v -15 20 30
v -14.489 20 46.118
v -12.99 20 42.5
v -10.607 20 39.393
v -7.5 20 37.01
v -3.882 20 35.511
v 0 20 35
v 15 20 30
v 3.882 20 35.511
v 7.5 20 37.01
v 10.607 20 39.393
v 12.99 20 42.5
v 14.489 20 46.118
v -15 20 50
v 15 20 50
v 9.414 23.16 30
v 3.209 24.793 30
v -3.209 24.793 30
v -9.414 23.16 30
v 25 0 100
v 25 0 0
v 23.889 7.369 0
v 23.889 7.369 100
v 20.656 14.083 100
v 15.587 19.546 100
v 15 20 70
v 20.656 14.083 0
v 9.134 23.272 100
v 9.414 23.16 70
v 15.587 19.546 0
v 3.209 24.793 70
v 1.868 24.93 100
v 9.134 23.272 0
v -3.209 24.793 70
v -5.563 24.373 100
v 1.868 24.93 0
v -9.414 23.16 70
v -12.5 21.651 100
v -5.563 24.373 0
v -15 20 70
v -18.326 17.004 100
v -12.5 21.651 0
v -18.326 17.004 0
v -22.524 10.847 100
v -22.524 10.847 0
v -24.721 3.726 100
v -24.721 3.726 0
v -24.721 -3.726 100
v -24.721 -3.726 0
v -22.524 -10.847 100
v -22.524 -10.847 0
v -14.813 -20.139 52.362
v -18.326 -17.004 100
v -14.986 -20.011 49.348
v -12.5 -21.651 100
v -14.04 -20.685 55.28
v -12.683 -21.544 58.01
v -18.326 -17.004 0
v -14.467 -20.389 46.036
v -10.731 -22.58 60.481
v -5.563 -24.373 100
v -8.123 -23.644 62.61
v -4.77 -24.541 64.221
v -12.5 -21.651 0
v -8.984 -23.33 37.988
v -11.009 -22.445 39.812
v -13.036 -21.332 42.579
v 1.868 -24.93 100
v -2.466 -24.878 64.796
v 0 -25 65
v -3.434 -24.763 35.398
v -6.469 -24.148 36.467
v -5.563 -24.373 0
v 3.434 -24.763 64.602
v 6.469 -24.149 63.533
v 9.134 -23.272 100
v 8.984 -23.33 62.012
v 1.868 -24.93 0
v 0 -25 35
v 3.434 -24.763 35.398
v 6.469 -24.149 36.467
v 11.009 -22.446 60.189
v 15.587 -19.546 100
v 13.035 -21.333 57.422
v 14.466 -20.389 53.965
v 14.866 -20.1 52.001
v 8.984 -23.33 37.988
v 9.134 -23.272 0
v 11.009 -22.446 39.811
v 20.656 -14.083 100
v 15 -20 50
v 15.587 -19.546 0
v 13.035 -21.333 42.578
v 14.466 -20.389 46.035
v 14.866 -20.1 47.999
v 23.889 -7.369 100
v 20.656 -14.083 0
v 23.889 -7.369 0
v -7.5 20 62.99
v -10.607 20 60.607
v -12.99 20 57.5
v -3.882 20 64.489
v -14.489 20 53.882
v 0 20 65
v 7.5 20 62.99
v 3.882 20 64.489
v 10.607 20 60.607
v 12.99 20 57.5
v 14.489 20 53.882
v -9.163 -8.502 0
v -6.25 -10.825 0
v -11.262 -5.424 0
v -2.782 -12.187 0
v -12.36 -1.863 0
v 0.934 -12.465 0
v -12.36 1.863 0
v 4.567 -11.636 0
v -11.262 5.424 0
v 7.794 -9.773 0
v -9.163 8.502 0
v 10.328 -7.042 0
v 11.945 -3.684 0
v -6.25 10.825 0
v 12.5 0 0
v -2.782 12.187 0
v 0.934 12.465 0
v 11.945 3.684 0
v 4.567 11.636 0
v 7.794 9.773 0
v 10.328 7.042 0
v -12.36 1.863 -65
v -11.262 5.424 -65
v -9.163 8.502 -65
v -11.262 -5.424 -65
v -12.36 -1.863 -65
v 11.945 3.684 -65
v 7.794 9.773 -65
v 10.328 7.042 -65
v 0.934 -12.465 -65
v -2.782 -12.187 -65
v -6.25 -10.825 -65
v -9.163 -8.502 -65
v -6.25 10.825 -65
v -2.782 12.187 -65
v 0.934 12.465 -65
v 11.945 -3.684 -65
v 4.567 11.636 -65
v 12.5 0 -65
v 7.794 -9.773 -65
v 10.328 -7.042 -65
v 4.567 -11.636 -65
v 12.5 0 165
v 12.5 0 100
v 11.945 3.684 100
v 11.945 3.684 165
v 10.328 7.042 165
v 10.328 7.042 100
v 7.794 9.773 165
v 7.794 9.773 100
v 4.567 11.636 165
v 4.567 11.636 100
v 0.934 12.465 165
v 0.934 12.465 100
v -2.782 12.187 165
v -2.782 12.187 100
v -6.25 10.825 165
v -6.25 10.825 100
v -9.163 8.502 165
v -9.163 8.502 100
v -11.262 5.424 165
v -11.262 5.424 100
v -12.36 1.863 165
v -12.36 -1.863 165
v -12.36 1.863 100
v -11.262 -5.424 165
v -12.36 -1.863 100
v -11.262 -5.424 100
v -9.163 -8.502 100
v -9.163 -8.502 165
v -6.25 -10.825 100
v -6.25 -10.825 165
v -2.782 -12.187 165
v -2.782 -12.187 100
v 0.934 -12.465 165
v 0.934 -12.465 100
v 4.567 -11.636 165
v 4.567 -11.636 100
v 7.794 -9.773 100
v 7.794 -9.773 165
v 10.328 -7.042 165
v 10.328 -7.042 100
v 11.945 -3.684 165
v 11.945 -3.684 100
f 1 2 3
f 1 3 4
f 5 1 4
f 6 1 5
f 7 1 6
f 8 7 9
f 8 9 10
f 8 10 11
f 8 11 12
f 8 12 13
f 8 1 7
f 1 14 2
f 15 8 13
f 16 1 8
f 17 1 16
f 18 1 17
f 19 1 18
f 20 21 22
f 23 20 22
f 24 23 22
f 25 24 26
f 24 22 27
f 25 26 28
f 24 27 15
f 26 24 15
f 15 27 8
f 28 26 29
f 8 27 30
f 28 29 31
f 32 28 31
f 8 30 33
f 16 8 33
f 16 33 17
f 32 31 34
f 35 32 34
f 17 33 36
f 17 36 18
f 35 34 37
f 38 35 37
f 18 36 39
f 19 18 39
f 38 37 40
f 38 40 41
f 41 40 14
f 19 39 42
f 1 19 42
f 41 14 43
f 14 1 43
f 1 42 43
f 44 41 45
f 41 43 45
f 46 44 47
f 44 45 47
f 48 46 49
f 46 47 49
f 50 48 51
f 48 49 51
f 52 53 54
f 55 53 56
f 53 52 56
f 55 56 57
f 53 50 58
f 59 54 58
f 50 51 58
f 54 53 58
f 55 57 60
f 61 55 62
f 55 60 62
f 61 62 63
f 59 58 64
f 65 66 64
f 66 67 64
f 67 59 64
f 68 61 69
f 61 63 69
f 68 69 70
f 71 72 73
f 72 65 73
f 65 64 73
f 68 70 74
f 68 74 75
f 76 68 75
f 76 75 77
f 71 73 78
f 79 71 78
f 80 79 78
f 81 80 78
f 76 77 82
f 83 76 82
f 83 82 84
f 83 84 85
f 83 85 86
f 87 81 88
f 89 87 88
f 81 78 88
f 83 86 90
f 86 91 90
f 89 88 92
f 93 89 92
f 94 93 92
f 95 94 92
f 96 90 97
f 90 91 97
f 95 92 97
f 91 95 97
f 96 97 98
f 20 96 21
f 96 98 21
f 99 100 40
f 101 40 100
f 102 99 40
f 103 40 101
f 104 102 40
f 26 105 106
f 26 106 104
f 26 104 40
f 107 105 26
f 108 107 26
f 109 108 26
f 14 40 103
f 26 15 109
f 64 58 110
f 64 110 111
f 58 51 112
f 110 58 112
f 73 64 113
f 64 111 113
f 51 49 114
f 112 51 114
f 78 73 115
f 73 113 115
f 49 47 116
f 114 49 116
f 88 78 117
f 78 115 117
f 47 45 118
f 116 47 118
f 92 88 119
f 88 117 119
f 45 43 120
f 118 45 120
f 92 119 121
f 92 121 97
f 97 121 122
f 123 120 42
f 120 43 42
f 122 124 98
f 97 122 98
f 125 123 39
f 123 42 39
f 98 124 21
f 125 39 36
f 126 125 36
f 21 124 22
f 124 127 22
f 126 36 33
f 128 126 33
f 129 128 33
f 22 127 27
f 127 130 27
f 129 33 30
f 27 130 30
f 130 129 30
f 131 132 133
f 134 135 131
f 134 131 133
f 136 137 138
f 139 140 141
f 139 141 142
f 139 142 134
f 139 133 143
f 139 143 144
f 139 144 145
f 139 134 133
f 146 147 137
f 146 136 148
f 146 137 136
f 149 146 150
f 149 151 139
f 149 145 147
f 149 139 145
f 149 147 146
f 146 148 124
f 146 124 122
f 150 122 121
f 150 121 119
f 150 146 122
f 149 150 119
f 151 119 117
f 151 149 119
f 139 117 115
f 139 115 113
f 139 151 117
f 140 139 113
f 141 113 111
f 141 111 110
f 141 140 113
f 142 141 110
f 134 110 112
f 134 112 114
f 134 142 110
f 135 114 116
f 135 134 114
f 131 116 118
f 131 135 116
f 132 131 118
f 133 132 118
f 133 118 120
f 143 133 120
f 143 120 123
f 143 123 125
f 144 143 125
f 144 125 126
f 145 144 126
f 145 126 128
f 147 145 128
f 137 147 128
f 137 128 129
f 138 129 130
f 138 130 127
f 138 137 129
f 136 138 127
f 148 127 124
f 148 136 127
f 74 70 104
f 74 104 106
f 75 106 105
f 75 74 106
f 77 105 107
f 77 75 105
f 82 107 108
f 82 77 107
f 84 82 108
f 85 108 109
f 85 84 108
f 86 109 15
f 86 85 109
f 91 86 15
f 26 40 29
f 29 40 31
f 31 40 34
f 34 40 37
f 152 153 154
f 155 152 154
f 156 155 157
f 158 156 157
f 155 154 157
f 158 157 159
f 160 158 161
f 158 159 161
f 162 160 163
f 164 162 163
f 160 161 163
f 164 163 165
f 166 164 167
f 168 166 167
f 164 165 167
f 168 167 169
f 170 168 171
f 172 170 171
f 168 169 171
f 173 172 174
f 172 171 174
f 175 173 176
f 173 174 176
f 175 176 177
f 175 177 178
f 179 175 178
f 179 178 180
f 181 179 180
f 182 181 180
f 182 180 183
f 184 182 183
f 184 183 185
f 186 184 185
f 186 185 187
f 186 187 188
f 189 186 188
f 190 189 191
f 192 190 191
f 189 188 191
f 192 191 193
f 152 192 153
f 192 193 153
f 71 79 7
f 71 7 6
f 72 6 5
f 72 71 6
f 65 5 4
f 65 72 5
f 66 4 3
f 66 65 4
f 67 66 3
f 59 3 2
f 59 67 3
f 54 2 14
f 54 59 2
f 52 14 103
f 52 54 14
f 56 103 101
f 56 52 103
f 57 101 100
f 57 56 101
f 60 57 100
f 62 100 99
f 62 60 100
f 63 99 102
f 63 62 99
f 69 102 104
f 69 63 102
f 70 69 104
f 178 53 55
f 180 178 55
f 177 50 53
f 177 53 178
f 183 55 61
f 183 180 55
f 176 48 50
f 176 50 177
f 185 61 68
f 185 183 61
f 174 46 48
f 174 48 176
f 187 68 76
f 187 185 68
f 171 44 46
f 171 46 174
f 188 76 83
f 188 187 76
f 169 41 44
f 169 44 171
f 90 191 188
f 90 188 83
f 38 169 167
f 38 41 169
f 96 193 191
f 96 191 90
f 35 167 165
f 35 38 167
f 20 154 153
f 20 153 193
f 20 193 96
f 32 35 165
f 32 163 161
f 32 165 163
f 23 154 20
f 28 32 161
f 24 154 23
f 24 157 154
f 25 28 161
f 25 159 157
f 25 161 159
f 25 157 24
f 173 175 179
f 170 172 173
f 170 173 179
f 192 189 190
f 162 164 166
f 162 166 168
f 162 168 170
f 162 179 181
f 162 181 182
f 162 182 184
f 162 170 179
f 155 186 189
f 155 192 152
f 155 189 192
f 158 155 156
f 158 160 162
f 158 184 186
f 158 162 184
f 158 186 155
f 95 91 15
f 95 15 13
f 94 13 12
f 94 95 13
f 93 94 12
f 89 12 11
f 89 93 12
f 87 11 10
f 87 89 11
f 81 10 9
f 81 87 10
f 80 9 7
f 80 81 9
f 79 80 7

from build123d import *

# Parameters (mm, degrees)
IZIM1_R                     = 25
Y_KSEKLIK_EKSTR_ZYON1_DEPTH = 100
IZIM2_R                     = 12.5
Y_KSEKLIK_EKSTR_ZYON2_DEPTH = 65
Y_KSEKLIK_EKSTR_ZYON3_START = 65
IZIM3_R                     = 12.5
Y_KSEKLIK_EKSTR_ZYON3_DEPTH = 65
KES_EKSTR_ZYON1_DEPTH       = 65
KES_EKSTR_ZYON1_DEPTH_BACK  = 65
IZIM4_R                     = 15
KES_EKSTR_ZYON2_START       = 20
IZIM5_W                     = 40
IZIM5_H                     = 40
KES_EKSTR_ZYON2_DEPTH       = 10


with BuildPart() as part:
    # Çizim1 → Yükseklik-Ekstrüzyon1 (new body)
    with BuildSketch(Plane.XY):
        Circle(IZIM1_R)
    extrude(amount=Y_KSEKLIK_EKSTR_ZYON1_DEPTH)

    # Çizim2 → Yükseklik-Ekstrüzyon2 (add)
    with BuildSketch(Plane.XY.offset(100)):
        Circle(IZIM2_R)
    extrude(amount=Y_KSEKLIK_EKSTR_ZYON2_DEPTH)

    # Çizim3 → Yükseklik-Ekstrüzyon3 (add)
    with BuildSketch(Plane(origin=(0, 0, 0), x_dir=(-1, 0, 0), z_dir=(0, 0, -1)).offset(Y_KSEKLIK_EKSTR_ZYON3_START)):
        Circle(IZIM3_R)
    extrude(amount=-Y_KSEKLIK_EKSTR_ZYON3_DEPTH)

    # Çizim4 → Kes-Ekstrüzyon1 (cut, two sides: drawn at the far end of the back side and taken through both)
    with BuildSketch(Plane(origin=(0, 0, 0), x_dir=(1, 0, 0), z_dir=(0, 1, 0)).offset(-KES_EKSTR_ZYON1_DEPTH_BACK)):
        with Locations((0, -50)):
            Circle(IZIM4_R)
    extrude(amount=KES_EKSTR_ZYON1_DEPTH + KES_EKSTR_ZYON1_DEPTH_BACK, mode=Mode.SUBTRACT)

    # Çizim5 → Kes-Ekstrüzyon2 (cut)
    with BuildSketch(Plane(origin=(0, 0, 0), x_dir=(1, 0, 0), z_dir=(0, 1, 0)).offset(KES_EKSTR_ZYON2_START)):
        with Locations((0, -50)):
            Rectangle(IZIM5_W, IZIM5_H)
    extrude(amount=KES_EKSTR_ZYON2_DEPTH, mode=Mode.SUBTRACT)


solid = part.part
